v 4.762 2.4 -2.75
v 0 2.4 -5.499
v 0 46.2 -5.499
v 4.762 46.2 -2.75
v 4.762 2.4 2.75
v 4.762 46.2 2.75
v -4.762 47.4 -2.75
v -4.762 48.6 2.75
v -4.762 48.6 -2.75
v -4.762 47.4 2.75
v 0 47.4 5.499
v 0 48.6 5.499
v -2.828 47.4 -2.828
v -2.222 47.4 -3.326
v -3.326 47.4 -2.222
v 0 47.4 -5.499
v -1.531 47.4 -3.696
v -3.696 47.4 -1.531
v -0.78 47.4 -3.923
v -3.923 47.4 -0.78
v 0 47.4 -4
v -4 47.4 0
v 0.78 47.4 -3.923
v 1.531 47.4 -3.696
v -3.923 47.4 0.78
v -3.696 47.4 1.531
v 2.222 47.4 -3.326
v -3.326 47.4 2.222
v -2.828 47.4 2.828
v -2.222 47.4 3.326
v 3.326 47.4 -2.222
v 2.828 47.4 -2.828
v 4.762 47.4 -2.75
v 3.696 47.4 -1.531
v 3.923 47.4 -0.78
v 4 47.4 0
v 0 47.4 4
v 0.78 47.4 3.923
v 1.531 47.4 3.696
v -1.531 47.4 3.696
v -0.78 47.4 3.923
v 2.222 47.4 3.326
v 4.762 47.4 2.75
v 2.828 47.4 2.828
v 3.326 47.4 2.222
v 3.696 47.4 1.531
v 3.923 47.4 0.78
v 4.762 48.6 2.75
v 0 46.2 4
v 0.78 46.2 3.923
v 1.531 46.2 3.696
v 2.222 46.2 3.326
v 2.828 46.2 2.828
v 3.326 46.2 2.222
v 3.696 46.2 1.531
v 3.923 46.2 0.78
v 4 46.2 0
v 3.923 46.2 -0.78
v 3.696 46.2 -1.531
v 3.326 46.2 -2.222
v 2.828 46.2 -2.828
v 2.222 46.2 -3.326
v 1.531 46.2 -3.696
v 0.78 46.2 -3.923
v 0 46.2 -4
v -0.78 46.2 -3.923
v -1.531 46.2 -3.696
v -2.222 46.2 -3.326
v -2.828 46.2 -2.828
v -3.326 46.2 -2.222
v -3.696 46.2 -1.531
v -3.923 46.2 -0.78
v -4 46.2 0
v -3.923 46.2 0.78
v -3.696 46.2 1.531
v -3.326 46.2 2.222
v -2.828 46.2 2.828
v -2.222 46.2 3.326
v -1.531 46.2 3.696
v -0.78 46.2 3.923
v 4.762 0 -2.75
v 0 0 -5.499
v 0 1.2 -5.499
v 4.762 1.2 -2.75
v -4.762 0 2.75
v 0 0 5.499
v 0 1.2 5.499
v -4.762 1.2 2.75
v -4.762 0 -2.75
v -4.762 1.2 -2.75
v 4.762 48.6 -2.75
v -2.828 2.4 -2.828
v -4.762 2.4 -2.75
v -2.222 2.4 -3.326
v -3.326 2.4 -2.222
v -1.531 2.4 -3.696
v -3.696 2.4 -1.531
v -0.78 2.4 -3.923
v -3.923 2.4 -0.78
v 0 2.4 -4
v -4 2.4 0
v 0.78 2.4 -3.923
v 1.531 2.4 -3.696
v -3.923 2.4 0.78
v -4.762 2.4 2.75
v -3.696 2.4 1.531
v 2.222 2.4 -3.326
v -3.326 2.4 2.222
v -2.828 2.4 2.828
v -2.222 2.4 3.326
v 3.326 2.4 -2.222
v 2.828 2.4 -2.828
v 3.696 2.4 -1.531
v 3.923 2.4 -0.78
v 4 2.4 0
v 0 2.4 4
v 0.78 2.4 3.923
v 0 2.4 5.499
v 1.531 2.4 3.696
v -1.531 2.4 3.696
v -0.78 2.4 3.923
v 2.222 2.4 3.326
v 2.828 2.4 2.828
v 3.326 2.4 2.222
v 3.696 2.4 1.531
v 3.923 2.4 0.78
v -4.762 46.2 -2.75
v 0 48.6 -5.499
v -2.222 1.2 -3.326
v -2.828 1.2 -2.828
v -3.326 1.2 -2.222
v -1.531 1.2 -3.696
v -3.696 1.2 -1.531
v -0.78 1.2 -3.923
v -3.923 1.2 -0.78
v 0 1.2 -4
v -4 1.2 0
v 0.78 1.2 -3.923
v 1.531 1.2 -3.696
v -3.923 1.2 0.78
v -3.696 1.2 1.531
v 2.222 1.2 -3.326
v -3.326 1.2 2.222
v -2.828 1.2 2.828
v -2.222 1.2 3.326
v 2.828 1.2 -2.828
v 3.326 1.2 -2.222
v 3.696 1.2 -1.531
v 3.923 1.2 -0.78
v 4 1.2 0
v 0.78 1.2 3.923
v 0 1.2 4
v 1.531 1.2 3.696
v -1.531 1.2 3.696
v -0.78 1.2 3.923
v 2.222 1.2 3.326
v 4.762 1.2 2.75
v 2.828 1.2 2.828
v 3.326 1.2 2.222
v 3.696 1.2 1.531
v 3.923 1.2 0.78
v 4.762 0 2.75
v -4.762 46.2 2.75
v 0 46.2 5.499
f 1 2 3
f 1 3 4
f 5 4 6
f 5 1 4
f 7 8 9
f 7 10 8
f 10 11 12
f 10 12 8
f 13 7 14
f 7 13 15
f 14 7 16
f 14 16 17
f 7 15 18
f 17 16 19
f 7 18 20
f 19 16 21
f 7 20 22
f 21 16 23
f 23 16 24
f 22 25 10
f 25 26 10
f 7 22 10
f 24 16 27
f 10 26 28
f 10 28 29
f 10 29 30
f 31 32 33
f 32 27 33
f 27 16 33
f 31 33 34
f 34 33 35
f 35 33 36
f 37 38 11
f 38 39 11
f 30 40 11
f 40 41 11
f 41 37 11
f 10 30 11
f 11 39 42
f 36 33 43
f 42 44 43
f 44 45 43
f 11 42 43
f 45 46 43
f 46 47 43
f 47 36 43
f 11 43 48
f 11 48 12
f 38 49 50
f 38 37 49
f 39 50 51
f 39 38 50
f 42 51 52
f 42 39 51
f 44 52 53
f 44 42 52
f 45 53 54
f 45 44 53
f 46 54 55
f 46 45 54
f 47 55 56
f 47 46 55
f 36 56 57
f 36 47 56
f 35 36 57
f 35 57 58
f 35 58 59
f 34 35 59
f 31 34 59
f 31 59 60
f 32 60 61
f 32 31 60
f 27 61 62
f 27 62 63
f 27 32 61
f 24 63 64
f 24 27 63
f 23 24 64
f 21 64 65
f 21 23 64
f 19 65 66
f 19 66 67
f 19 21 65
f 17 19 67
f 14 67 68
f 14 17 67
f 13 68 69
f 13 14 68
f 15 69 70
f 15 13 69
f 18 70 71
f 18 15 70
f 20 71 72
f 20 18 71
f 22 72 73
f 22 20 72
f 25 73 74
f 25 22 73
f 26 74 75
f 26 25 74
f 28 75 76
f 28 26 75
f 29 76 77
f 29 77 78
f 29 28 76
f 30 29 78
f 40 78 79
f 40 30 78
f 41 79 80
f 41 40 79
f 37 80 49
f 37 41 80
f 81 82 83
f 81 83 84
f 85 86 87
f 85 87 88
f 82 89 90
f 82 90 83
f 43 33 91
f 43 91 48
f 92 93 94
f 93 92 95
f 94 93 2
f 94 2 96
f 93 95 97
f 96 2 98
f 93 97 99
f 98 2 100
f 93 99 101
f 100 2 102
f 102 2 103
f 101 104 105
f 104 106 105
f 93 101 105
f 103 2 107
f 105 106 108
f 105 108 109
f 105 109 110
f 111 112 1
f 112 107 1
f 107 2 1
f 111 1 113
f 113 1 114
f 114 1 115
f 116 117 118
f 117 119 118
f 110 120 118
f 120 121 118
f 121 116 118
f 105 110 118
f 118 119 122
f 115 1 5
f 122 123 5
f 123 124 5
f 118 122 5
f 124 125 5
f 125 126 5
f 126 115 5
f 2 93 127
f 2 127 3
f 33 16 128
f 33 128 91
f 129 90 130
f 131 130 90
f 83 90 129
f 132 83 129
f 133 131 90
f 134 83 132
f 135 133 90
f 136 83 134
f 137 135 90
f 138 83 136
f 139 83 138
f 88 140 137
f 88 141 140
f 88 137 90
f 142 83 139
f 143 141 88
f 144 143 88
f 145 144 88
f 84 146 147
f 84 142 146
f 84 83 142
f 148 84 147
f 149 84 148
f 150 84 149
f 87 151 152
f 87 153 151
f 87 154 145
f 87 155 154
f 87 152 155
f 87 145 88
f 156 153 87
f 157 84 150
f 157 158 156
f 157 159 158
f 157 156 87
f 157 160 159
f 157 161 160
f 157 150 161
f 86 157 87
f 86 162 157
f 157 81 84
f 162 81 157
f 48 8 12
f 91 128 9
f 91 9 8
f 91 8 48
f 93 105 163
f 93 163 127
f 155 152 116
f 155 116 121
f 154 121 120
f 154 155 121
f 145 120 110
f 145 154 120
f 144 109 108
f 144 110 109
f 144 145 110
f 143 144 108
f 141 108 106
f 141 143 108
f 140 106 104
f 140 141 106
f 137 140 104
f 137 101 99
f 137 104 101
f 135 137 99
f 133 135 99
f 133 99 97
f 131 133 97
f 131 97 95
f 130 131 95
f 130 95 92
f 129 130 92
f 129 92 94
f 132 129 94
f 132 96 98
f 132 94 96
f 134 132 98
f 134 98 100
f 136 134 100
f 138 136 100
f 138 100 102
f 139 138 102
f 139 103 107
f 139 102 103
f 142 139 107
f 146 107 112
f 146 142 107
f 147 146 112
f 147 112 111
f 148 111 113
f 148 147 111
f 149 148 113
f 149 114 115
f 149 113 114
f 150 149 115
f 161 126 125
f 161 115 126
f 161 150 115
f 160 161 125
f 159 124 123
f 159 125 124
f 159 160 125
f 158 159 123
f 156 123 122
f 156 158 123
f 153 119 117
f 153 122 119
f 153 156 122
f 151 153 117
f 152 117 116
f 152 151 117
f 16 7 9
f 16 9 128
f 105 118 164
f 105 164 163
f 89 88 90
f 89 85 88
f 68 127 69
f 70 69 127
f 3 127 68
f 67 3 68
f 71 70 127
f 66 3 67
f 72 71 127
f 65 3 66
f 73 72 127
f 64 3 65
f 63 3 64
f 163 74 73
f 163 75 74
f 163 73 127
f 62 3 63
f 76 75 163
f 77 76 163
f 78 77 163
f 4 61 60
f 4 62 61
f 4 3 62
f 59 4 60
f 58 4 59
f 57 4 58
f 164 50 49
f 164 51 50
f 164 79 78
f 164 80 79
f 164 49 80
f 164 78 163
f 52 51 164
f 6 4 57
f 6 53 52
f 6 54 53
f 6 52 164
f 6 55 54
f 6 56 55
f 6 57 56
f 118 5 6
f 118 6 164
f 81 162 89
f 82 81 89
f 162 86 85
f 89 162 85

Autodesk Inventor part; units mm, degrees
ref_plane "YZ Plane" through (0, 0, 0) normal (1, 0, 0) x (0, 1, 0)
ref_plane "XZ Plane" through (0, 0, 0) normal (0, 1, 0) x (-1, 0, 0)
ref_plane "XY Plane" through (0, 0, 0) normal (0, 0, 1) x (1, 0, 0)
sketch "Sketch1" plane through (0, 0, 0) normal (0, 1, 0) x (-1, 0, 0)
  line L0 (4.7625, 2.7496) -> (4.7625, -2.7496)
  line L1 (4.7625, -2.7496) -> (0, -5.4993)
  line L2 (0, -5.4993) -> (-4.7625, -2.7496)
  line L3 (-4.7625, -2.7496) -> (-4.7625, 2.7496)
  line L4 (-4.7625, 2.7496) -> (0, 5.4993)
  line L5 (0, 5.4993) -> (4.7625, 2.7496)
  point P0 (0, 0)
  point P1 (0, 0)
  dimension "d0" = 9.525
extrude "Extrusion1" add sketch "Sketch1" along normal blind 49.8
sketch "Sketch2" plane through (0, 0, 0) normal (1, 0, 0) x (0, 1, 0)
  line L0 (1.2, 14) -> (2.4, 14)
  line L1 (2.4, 14) -> (2.4, 4)
  line L2 (2.4, 4) -> (1.2, 4)
  line L3 (1.2, 4) -> (1.2, 14)
  line L4 (0, -2.7496) -> (0, 2.7496) projected
  line L5 (-9.48, 0) -> (56.88, 0) projected
  line L6 (47.4, 14) -> (46.2, 14)
  line L7 (46.2, 14) -> (46.2, 4)
  line L8 (46.2, 4) -> (47.4, 4)
  line L9 (47.4, 4) -> (47.4, 14)
  point P0 (0, 0)
  point P1 (0, 0)
  point P2 (1.8, 14)
  dimension "d3" = 1.2
  dimension "d4" = 1.2
  dimension "d5" = 4
  dimension "d6" = 10
  dimension "d8" = 43.8
revolve "Revolution1" cut sketch "Sketch2" angle 360 about axis through (0, -10, 0) along (0, 1, 0)
sketch "Sketch3" plane through (0, 49.8, 0) normal (0, 1, 0) x (1, 0, 0)
  line L0 (0, -5.4993) -> (4.7625, -2.7496) projected
  line L1 (4.7625, -2.7496) -> (4.7625, 2.7496) projected
  line L2 (4.7625, 2.7496) -> (0, 5.4993) projected
  line L3 (0, 5.4993) -> (-4.7625, 2.7496) projected
  line L4 (-4.7625, 2.7496) -> (-4.7625, -2.7496) projected
  line L5 (-4.7625, -2.7496) -> (0, -5.4993) projected
  point P0 (0, 0)
extrude "Extrusion2" cut sketch "Sketch3" against normal blind 1.2
properties part number "Wasp Intermediate Axel"
